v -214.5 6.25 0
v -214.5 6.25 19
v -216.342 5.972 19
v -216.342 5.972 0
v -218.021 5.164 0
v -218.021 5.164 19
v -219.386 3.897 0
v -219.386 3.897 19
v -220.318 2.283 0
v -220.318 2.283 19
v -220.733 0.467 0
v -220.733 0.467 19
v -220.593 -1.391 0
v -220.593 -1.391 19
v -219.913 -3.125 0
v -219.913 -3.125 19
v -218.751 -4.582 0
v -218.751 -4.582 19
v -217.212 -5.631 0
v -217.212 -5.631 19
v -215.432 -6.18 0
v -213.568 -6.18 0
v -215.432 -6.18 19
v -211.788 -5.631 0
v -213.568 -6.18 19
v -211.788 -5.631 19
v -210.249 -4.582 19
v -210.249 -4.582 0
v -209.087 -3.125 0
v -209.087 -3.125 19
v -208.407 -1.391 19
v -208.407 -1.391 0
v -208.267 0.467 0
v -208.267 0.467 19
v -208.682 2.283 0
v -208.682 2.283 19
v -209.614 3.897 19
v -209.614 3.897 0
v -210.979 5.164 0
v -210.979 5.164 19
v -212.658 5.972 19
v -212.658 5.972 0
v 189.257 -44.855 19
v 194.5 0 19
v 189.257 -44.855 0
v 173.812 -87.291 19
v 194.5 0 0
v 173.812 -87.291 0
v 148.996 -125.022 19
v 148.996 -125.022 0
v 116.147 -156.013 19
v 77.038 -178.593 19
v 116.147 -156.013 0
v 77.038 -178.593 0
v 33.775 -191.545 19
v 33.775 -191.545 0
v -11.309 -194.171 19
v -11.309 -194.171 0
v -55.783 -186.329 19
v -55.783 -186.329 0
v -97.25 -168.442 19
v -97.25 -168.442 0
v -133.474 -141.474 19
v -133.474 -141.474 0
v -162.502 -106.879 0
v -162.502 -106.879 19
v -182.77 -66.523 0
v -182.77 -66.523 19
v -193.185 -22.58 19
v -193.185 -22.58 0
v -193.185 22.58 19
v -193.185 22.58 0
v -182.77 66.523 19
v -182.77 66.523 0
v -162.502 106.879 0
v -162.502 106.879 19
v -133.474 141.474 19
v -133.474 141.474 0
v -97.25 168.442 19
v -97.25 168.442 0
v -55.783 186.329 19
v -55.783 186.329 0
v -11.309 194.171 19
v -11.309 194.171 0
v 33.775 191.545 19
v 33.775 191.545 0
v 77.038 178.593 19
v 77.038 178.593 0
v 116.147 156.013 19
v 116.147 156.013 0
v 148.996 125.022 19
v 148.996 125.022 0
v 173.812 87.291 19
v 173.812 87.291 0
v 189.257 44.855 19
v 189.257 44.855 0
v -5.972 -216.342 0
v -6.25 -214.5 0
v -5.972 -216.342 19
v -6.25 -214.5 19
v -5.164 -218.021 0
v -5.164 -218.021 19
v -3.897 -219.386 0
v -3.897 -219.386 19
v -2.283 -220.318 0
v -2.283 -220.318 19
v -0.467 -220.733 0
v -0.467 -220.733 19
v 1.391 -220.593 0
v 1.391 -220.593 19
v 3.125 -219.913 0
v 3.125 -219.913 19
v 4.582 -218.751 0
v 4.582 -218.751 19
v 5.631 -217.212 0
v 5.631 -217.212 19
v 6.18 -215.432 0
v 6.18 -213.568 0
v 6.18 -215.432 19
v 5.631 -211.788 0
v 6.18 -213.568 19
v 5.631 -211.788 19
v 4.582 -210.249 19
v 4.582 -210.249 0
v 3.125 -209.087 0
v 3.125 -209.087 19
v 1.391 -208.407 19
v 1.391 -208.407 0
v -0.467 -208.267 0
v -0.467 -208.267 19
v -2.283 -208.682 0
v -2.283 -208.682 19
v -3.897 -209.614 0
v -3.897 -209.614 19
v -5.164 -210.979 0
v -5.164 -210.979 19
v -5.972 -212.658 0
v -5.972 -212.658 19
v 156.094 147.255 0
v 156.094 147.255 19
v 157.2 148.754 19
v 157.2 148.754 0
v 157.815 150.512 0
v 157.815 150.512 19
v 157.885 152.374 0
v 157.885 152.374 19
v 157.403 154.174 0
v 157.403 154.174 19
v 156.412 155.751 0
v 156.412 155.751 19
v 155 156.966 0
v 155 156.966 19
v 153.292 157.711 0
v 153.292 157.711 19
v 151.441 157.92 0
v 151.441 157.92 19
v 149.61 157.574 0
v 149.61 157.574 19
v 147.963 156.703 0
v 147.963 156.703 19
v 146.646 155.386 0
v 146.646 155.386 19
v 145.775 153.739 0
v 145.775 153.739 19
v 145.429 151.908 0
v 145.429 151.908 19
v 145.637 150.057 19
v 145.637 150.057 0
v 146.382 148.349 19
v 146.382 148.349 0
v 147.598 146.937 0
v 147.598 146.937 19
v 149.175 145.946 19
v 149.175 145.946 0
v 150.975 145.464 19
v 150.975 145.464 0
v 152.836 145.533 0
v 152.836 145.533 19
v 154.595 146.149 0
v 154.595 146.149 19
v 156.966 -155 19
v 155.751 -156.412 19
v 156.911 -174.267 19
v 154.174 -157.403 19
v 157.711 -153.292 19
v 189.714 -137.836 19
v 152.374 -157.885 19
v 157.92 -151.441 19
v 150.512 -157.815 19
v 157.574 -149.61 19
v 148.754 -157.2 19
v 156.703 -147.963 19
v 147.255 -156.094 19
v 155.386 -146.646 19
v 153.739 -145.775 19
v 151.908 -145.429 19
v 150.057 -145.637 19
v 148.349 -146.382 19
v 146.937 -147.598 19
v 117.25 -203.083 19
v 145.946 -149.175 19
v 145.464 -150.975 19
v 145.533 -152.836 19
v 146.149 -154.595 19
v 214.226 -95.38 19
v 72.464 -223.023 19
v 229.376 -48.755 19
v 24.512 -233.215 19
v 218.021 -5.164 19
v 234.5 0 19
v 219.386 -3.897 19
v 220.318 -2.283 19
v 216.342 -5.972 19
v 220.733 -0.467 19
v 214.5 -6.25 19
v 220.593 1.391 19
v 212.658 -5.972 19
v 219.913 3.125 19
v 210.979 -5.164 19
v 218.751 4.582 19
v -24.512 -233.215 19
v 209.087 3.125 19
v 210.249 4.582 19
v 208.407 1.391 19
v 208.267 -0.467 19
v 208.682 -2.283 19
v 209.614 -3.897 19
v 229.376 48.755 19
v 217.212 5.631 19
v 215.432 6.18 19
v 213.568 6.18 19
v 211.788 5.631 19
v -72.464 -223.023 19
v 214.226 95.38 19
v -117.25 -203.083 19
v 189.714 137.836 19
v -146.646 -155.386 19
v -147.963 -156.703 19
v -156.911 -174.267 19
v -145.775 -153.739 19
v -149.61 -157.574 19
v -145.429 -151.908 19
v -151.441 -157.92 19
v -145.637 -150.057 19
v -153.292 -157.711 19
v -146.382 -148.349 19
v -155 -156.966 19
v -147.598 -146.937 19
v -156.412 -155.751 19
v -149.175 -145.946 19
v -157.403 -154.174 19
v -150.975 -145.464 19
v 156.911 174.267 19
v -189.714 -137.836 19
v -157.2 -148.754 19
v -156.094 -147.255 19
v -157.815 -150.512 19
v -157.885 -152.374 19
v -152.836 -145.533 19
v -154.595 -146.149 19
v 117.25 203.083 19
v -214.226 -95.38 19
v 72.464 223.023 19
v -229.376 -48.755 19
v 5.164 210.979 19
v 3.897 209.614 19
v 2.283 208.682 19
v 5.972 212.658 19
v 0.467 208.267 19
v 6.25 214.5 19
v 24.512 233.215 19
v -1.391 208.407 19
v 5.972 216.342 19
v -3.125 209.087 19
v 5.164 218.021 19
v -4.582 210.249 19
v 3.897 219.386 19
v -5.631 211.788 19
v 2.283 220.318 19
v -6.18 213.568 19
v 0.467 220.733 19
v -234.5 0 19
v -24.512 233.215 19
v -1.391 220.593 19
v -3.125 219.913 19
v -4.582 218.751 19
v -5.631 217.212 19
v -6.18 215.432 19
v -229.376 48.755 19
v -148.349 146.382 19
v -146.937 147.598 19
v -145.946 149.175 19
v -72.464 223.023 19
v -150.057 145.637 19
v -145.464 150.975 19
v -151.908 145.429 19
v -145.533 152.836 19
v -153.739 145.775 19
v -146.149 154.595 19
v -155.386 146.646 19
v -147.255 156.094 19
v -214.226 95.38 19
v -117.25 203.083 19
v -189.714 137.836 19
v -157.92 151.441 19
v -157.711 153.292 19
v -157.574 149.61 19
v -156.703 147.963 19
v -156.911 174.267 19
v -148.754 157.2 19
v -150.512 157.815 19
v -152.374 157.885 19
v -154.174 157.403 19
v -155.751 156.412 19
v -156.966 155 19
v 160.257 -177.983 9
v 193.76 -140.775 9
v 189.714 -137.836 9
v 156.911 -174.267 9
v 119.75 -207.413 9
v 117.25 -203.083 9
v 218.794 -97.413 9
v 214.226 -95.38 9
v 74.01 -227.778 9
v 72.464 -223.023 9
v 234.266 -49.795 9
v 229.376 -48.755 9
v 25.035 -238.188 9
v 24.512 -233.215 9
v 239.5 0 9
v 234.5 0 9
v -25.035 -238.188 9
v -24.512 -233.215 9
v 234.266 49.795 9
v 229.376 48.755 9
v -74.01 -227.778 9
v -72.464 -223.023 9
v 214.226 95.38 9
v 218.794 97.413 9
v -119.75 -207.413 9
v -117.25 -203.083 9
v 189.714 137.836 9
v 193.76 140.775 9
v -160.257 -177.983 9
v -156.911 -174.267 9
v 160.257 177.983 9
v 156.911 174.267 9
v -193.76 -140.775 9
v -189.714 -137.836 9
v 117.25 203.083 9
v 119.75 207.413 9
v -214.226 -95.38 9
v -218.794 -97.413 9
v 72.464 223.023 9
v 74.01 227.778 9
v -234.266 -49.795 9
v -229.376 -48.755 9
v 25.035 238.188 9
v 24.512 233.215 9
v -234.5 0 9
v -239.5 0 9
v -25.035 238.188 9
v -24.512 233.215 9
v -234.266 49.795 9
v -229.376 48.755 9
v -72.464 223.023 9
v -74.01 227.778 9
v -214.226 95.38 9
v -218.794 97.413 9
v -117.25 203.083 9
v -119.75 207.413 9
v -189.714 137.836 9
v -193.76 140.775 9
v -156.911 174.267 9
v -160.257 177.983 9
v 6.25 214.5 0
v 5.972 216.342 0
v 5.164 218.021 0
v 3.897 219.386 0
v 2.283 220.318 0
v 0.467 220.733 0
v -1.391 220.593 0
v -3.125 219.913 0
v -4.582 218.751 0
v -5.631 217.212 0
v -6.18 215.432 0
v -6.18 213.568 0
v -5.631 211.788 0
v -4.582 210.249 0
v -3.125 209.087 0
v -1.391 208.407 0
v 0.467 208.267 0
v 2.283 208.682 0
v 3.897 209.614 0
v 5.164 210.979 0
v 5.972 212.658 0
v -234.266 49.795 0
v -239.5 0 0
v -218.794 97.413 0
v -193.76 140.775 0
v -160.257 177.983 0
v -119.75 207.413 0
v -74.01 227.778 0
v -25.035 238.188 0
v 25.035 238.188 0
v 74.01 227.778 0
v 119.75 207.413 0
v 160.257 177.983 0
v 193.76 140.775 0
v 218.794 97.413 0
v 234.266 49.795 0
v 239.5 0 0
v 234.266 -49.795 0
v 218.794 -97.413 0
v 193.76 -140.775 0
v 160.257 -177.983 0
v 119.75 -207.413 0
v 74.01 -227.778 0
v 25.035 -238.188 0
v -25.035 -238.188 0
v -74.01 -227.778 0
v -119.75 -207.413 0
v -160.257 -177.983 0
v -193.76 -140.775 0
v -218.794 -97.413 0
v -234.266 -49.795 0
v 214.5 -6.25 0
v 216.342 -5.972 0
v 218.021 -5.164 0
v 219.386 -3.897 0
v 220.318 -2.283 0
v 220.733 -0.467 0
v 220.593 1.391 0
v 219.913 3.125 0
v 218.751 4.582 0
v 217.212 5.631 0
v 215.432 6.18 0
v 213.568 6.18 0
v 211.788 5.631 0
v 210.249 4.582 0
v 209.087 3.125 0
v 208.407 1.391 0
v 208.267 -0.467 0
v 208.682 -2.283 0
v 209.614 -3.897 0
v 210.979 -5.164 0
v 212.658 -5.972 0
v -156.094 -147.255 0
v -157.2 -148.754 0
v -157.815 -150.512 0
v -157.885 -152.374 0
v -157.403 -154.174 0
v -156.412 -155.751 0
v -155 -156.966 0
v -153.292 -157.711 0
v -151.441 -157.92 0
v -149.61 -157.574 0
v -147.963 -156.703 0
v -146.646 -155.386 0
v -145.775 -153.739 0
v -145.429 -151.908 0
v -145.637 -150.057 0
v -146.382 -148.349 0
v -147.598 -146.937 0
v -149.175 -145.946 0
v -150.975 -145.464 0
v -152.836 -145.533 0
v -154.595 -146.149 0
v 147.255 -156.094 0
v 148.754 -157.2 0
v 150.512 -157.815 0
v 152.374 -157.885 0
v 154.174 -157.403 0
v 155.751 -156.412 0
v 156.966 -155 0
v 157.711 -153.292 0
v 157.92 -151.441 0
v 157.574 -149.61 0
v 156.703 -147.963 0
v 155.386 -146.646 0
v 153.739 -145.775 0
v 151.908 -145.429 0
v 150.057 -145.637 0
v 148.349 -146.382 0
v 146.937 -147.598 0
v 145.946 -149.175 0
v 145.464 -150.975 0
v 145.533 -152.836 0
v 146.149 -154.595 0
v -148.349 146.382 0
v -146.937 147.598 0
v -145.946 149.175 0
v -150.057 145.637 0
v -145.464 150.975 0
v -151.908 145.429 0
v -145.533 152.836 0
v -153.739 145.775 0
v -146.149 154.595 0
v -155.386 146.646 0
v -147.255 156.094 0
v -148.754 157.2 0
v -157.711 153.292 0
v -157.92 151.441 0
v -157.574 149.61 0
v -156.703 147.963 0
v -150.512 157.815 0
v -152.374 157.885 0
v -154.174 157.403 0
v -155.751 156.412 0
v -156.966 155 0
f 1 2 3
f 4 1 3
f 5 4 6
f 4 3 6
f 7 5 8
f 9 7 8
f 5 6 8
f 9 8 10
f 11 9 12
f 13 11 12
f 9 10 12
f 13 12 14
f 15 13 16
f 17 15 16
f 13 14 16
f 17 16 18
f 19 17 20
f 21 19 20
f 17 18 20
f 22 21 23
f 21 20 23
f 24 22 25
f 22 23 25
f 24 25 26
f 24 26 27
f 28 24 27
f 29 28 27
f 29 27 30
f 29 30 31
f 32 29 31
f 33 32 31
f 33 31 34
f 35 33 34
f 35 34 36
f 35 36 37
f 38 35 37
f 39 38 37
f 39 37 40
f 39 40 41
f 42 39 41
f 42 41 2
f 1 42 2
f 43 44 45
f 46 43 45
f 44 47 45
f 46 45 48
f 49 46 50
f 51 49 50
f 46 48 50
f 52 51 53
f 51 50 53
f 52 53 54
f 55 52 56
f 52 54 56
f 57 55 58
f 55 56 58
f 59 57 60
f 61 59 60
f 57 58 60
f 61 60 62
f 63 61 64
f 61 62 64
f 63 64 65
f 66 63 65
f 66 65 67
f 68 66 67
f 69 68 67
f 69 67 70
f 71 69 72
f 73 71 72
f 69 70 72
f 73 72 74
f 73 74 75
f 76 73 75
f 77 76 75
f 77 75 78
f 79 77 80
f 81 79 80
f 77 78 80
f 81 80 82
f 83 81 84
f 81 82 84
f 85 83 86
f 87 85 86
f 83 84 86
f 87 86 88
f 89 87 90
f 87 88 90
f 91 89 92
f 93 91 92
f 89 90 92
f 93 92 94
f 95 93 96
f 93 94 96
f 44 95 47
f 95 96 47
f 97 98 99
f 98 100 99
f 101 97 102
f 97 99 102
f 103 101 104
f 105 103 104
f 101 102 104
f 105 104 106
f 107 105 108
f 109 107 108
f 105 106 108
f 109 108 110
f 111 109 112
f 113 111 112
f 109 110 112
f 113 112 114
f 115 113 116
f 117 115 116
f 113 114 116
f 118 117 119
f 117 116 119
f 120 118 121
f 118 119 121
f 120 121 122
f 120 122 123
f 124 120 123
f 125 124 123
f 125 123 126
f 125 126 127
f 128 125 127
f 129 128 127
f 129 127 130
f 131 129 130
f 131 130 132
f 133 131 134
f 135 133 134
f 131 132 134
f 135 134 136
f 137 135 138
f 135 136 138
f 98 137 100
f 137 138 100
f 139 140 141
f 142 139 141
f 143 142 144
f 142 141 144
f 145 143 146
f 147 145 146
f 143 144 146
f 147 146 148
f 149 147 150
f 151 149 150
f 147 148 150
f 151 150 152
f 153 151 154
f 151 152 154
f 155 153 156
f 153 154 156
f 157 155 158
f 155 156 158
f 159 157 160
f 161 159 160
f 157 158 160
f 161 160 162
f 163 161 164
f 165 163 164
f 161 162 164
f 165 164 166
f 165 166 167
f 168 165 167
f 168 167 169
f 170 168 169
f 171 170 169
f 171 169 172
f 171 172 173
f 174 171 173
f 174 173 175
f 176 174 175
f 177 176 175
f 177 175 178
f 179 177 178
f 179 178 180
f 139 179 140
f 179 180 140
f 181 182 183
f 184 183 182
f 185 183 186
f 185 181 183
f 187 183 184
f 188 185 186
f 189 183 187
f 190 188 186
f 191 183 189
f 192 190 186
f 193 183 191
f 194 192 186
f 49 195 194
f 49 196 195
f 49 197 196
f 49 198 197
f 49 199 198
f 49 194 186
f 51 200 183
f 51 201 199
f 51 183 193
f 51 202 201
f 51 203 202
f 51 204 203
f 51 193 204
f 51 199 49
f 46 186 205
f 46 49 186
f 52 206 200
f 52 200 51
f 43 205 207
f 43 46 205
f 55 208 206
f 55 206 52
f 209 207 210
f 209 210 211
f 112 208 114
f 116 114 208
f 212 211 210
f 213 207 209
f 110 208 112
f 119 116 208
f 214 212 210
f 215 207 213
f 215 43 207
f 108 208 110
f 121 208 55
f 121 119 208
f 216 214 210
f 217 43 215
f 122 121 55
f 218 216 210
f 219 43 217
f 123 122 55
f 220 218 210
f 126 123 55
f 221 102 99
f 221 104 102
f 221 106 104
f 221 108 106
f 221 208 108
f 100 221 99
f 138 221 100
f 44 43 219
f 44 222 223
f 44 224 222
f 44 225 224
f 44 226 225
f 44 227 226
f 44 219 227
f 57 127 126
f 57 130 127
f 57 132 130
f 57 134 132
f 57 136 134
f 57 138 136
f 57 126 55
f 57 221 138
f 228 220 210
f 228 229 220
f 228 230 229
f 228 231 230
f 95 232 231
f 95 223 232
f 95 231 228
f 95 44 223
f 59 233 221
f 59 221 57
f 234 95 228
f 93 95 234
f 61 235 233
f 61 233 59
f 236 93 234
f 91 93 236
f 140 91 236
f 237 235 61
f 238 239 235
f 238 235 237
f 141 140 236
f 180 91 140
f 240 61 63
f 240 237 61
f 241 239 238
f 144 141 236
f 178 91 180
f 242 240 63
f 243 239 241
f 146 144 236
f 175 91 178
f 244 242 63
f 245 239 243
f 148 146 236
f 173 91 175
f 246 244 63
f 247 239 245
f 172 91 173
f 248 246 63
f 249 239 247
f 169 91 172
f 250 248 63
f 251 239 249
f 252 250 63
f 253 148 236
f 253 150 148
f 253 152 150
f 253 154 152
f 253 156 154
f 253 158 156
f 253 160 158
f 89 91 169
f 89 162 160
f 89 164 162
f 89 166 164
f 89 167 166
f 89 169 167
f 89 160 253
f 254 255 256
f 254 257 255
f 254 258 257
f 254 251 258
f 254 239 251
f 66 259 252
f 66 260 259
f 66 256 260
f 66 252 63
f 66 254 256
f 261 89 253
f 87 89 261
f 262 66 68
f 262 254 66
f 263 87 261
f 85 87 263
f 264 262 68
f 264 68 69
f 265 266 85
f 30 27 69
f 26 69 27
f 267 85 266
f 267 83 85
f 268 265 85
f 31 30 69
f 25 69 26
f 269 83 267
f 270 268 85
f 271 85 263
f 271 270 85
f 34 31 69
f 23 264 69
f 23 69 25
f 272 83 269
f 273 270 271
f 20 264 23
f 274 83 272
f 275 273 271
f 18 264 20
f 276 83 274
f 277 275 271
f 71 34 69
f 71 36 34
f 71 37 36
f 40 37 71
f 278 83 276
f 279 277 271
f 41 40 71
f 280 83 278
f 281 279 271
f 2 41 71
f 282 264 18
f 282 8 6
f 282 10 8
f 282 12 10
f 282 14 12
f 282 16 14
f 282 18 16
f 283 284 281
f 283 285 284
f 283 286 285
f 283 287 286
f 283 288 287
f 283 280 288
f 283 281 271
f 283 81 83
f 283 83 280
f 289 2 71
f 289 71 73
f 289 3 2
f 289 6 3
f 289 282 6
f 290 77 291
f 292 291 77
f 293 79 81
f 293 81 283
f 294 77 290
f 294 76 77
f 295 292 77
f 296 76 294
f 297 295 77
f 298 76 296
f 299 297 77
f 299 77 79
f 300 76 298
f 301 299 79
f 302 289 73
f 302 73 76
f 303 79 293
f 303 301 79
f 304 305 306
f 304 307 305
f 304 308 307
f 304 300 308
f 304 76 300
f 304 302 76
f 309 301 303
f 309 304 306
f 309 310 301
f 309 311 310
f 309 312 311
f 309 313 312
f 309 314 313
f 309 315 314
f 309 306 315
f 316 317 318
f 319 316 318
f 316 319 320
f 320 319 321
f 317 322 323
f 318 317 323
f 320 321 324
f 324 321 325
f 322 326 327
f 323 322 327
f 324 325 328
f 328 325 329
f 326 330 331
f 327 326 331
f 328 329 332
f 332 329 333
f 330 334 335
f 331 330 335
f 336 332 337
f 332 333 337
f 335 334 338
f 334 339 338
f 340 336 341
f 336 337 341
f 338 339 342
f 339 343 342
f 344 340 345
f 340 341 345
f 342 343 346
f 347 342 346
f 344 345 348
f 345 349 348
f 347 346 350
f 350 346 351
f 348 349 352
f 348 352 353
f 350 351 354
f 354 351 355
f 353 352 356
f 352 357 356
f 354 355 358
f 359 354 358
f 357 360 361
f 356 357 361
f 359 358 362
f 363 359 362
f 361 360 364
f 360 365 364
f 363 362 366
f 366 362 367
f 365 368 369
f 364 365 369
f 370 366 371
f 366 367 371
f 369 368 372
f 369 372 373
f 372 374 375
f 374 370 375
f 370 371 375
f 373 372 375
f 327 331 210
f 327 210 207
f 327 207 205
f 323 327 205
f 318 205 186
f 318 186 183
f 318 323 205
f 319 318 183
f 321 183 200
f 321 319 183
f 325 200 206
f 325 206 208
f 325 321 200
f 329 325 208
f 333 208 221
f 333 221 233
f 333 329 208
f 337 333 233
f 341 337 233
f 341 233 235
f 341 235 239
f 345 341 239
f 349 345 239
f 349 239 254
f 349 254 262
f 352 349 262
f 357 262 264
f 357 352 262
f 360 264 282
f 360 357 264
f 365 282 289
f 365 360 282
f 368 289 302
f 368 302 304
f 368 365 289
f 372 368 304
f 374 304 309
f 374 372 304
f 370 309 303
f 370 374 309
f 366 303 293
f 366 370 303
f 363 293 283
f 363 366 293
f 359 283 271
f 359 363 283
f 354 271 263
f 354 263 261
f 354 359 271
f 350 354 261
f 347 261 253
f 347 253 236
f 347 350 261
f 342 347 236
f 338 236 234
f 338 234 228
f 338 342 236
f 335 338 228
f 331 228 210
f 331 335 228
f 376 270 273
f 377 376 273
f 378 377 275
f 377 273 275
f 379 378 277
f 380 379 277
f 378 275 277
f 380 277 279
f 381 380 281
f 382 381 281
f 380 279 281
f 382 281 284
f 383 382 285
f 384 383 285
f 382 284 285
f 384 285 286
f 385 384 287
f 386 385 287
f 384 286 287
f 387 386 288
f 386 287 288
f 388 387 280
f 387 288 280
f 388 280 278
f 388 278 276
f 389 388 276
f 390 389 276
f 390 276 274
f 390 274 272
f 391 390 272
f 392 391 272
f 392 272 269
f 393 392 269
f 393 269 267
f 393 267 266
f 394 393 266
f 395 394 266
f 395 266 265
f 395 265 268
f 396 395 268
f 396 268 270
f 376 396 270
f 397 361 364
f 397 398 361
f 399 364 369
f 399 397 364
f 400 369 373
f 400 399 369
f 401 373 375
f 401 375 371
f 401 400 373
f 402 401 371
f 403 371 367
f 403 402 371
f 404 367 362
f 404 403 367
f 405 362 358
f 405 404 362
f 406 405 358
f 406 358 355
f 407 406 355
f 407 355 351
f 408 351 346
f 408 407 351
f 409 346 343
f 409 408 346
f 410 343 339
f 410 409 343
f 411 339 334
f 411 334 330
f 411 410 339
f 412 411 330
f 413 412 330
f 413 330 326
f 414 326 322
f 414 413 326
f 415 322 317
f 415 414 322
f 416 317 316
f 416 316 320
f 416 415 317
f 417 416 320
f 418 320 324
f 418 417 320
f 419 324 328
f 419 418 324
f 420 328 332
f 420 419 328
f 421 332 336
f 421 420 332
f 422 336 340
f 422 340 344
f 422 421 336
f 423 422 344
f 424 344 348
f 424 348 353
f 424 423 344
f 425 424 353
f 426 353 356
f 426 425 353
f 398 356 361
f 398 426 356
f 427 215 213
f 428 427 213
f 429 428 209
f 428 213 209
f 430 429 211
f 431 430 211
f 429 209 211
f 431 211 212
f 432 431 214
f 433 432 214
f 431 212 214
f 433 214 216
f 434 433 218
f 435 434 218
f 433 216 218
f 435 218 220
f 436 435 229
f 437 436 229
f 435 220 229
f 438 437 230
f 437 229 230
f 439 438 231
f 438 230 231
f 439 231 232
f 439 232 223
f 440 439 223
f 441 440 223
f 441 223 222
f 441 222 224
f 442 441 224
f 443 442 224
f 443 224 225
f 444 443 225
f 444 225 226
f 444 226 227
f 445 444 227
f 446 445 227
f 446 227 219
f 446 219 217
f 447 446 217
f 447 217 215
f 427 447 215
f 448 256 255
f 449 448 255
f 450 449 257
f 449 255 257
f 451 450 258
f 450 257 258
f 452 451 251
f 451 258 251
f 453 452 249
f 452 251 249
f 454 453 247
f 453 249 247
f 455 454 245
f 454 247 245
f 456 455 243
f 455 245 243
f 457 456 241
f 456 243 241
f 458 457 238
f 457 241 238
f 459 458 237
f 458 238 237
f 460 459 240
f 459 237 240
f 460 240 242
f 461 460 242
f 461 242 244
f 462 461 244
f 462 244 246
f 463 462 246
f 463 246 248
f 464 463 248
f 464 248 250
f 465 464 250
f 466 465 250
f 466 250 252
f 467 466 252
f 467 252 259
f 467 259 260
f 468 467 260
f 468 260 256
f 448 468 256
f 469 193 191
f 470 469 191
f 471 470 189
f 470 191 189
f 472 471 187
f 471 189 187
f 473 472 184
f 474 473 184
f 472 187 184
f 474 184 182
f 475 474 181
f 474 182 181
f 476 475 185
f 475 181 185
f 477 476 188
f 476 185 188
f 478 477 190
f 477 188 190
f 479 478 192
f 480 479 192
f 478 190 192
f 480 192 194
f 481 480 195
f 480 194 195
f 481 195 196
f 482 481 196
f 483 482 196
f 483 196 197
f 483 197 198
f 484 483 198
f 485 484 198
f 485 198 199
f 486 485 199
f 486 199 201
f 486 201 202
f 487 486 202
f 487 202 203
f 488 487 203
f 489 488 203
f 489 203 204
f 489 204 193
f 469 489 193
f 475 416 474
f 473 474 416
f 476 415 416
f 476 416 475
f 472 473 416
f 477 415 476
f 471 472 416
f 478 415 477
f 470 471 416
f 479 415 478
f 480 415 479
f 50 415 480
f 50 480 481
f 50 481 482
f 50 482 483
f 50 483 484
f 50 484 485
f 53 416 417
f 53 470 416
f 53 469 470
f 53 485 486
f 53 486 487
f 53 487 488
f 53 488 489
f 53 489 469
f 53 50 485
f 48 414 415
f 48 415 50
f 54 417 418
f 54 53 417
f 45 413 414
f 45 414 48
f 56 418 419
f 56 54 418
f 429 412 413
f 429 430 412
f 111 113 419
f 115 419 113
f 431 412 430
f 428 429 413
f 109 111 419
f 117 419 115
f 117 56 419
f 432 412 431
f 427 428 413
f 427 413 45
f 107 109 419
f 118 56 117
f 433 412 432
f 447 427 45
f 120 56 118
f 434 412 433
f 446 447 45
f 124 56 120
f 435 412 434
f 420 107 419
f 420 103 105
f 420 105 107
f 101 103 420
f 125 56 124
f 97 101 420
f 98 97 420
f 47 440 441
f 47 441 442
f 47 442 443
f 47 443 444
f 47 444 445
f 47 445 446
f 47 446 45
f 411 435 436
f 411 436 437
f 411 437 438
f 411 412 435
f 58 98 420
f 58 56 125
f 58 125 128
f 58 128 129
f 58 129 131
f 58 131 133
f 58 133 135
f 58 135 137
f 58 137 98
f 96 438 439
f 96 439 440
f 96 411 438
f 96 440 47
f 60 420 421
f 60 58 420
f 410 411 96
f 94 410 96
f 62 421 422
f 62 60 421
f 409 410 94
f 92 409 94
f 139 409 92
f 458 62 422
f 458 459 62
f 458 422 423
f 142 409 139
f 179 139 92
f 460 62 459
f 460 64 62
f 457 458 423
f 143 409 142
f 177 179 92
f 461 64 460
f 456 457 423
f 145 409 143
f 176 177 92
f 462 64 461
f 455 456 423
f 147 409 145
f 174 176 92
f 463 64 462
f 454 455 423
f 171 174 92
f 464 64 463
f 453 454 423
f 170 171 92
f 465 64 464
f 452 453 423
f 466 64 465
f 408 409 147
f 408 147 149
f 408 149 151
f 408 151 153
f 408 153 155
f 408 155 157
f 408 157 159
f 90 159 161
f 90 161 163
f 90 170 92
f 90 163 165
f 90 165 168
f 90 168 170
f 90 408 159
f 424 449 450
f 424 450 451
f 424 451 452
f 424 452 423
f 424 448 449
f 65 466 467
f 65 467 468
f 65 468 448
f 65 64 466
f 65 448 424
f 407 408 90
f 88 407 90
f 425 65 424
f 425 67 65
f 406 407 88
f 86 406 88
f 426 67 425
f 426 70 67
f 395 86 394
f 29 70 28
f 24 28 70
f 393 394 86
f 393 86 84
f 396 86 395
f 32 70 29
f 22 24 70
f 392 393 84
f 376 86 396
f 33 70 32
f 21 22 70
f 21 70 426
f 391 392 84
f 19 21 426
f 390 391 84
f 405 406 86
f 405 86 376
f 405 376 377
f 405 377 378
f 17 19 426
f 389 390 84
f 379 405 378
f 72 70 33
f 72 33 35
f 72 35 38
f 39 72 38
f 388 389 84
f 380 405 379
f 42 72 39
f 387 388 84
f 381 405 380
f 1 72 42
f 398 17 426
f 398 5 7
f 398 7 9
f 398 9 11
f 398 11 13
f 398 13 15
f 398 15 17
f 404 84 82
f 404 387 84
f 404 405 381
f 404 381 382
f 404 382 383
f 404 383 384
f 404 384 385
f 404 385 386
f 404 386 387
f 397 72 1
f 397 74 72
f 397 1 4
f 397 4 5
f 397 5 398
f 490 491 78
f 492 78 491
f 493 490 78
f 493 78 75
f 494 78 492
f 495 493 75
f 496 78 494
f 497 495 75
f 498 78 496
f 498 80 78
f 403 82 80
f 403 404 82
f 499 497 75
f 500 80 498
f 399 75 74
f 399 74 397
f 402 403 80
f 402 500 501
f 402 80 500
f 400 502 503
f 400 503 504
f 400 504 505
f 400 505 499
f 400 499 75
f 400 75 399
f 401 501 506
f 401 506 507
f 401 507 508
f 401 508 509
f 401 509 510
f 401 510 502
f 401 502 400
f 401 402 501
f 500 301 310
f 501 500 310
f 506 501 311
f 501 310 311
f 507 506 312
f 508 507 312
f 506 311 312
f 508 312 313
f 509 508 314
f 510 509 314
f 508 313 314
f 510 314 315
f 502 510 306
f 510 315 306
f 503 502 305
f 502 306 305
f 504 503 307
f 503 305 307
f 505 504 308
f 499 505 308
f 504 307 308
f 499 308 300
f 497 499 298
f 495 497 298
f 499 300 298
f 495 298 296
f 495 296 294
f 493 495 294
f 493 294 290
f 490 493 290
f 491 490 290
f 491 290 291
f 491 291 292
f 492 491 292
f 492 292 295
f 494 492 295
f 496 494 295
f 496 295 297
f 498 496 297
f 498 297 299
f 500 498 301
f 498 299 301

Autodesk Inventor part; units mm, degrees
ref_plane "YZ Plane" through (0, 0, 0) normal (1, 0, 0) x (0, 1, 0)
ref_plane "XZ Plane" through (0, 0, 0) normal (0, 1, 0) x (-1, 0, 0)
ref_plane "XY Plane" through (0, 0, 0) normal (0, 0, 1) x (1, 0, 0)
sketch "Sketch1" plane through (0, 0, 0) normal (0, 0, 1) x (1, 0, 0)
  circle A0 centre (0, 0) radius 194.5
  circle A1 centre (0, 0) radius 234.5
  dimension "d0" = 40
  dimension "d1" = 389
extrude "Extrusion1" add sketch "Sketch1" along normal blind 38
sketch "Sketch2" plane through (0, 0, 38) normal (0, 0, 1) x (1, 0, 0)
  circle A0 centre (0, 0) radius 234.5 construction
  circle A1 centre (0, 0) radius 194.5 construction
  line L0 (0, 234.5) -> (0, 194.5) construction
  circle A2 centre (0, 214.5) radius 6.25
  dimension "d4" = 12.5
extrude "Extrusion2" cut sketch "Sketch2" against normal through all
sketch "Sketch3" plane through (0, 0, 38) normal (0, 0, 1) x (1, 0, 0)
  circle A0 centre (0, 214.5) radius 6.25 projected
  circle A1 centre (0, 214.5) radius 13.75
  point P0 (0, 0)
  dimension "d10" = 27.5
extrude "Extrusion3" cut sketch "Sketch3" against normal blind 11
pattern_circular "Circular Pattern1" count 8 over 360 about axis through (0, 0, 0) along (0, 0, 1) of "Extrusion2", "Extrusion3"
sketch "Sketch4" plane through (0, 0, 0) normal (0, 0, -1) x (-1, 0, 0)
  circle A0 centre (0, 0) radius 234.5 projected
  circle A1 centre (0, 0) radius 239.5
  dimension "d13" = 5
extrude "Extrusion4" add sketch "Sketch4" against normal blind 9
sketch "Sketch5" plane through (0, 0, 0) normal (1, 0, 0) x (0, 1, 0)
  line L0 (234.5, 9) -> (234.5, 38) projected
  line L1 (239.5, 9) -> (-239.5, 9) projected
  line L2 (239.5, 0) -> (239.5, 9) projected
  line L3 (-239.5, 0) -> (239.5, 0) projected
  line L4 (-234.5, 9) -> (-234.5, 38) projected
  line L5 (-239.5, 0) -> (-239.5, 9) projected
  line L6 (-234.5, 19) -> (234.5, 19)
  line L7 (234.5, 38) -> (-234.5, 38) projected
  line L8 (234.5, 38) -> (-234.5, 38)
  point P0 (0, 0)
  dimension "d16" = 38
  dimension "d17" = 19
extrude "Extrusion5" cut sketch "Sketch5" along normal through all both and the other way through all contours L6 L4 L7 L0
equation "\"d1\" = Вал_ось_диаметр_КОРМА"
equation "\"BendRadius\" = Thickness"
equation "\"BendReliefWidth\" = Thickness"
equation "\"BendReliefDepth\" = 0.5 * Thickness"
equation "\"CornerReliefSize\" = 4 * Thickness"
equation "\"MinimumRemnant\" = 2 * Thickness"
equation "\"TransitionRadius\" = BendRadius"
equation "\"JacobiRadiusSize\" = BendRadius"
equation "\"GapSize\" = Thickness"
equation "\"Вал_ось_диаметр_КОРМА\" = 389"
equation "\"Thickness\" = 19"
properties part number "ДМФ 01 32.2 Барабан Опорное кольцо КОРМА"
